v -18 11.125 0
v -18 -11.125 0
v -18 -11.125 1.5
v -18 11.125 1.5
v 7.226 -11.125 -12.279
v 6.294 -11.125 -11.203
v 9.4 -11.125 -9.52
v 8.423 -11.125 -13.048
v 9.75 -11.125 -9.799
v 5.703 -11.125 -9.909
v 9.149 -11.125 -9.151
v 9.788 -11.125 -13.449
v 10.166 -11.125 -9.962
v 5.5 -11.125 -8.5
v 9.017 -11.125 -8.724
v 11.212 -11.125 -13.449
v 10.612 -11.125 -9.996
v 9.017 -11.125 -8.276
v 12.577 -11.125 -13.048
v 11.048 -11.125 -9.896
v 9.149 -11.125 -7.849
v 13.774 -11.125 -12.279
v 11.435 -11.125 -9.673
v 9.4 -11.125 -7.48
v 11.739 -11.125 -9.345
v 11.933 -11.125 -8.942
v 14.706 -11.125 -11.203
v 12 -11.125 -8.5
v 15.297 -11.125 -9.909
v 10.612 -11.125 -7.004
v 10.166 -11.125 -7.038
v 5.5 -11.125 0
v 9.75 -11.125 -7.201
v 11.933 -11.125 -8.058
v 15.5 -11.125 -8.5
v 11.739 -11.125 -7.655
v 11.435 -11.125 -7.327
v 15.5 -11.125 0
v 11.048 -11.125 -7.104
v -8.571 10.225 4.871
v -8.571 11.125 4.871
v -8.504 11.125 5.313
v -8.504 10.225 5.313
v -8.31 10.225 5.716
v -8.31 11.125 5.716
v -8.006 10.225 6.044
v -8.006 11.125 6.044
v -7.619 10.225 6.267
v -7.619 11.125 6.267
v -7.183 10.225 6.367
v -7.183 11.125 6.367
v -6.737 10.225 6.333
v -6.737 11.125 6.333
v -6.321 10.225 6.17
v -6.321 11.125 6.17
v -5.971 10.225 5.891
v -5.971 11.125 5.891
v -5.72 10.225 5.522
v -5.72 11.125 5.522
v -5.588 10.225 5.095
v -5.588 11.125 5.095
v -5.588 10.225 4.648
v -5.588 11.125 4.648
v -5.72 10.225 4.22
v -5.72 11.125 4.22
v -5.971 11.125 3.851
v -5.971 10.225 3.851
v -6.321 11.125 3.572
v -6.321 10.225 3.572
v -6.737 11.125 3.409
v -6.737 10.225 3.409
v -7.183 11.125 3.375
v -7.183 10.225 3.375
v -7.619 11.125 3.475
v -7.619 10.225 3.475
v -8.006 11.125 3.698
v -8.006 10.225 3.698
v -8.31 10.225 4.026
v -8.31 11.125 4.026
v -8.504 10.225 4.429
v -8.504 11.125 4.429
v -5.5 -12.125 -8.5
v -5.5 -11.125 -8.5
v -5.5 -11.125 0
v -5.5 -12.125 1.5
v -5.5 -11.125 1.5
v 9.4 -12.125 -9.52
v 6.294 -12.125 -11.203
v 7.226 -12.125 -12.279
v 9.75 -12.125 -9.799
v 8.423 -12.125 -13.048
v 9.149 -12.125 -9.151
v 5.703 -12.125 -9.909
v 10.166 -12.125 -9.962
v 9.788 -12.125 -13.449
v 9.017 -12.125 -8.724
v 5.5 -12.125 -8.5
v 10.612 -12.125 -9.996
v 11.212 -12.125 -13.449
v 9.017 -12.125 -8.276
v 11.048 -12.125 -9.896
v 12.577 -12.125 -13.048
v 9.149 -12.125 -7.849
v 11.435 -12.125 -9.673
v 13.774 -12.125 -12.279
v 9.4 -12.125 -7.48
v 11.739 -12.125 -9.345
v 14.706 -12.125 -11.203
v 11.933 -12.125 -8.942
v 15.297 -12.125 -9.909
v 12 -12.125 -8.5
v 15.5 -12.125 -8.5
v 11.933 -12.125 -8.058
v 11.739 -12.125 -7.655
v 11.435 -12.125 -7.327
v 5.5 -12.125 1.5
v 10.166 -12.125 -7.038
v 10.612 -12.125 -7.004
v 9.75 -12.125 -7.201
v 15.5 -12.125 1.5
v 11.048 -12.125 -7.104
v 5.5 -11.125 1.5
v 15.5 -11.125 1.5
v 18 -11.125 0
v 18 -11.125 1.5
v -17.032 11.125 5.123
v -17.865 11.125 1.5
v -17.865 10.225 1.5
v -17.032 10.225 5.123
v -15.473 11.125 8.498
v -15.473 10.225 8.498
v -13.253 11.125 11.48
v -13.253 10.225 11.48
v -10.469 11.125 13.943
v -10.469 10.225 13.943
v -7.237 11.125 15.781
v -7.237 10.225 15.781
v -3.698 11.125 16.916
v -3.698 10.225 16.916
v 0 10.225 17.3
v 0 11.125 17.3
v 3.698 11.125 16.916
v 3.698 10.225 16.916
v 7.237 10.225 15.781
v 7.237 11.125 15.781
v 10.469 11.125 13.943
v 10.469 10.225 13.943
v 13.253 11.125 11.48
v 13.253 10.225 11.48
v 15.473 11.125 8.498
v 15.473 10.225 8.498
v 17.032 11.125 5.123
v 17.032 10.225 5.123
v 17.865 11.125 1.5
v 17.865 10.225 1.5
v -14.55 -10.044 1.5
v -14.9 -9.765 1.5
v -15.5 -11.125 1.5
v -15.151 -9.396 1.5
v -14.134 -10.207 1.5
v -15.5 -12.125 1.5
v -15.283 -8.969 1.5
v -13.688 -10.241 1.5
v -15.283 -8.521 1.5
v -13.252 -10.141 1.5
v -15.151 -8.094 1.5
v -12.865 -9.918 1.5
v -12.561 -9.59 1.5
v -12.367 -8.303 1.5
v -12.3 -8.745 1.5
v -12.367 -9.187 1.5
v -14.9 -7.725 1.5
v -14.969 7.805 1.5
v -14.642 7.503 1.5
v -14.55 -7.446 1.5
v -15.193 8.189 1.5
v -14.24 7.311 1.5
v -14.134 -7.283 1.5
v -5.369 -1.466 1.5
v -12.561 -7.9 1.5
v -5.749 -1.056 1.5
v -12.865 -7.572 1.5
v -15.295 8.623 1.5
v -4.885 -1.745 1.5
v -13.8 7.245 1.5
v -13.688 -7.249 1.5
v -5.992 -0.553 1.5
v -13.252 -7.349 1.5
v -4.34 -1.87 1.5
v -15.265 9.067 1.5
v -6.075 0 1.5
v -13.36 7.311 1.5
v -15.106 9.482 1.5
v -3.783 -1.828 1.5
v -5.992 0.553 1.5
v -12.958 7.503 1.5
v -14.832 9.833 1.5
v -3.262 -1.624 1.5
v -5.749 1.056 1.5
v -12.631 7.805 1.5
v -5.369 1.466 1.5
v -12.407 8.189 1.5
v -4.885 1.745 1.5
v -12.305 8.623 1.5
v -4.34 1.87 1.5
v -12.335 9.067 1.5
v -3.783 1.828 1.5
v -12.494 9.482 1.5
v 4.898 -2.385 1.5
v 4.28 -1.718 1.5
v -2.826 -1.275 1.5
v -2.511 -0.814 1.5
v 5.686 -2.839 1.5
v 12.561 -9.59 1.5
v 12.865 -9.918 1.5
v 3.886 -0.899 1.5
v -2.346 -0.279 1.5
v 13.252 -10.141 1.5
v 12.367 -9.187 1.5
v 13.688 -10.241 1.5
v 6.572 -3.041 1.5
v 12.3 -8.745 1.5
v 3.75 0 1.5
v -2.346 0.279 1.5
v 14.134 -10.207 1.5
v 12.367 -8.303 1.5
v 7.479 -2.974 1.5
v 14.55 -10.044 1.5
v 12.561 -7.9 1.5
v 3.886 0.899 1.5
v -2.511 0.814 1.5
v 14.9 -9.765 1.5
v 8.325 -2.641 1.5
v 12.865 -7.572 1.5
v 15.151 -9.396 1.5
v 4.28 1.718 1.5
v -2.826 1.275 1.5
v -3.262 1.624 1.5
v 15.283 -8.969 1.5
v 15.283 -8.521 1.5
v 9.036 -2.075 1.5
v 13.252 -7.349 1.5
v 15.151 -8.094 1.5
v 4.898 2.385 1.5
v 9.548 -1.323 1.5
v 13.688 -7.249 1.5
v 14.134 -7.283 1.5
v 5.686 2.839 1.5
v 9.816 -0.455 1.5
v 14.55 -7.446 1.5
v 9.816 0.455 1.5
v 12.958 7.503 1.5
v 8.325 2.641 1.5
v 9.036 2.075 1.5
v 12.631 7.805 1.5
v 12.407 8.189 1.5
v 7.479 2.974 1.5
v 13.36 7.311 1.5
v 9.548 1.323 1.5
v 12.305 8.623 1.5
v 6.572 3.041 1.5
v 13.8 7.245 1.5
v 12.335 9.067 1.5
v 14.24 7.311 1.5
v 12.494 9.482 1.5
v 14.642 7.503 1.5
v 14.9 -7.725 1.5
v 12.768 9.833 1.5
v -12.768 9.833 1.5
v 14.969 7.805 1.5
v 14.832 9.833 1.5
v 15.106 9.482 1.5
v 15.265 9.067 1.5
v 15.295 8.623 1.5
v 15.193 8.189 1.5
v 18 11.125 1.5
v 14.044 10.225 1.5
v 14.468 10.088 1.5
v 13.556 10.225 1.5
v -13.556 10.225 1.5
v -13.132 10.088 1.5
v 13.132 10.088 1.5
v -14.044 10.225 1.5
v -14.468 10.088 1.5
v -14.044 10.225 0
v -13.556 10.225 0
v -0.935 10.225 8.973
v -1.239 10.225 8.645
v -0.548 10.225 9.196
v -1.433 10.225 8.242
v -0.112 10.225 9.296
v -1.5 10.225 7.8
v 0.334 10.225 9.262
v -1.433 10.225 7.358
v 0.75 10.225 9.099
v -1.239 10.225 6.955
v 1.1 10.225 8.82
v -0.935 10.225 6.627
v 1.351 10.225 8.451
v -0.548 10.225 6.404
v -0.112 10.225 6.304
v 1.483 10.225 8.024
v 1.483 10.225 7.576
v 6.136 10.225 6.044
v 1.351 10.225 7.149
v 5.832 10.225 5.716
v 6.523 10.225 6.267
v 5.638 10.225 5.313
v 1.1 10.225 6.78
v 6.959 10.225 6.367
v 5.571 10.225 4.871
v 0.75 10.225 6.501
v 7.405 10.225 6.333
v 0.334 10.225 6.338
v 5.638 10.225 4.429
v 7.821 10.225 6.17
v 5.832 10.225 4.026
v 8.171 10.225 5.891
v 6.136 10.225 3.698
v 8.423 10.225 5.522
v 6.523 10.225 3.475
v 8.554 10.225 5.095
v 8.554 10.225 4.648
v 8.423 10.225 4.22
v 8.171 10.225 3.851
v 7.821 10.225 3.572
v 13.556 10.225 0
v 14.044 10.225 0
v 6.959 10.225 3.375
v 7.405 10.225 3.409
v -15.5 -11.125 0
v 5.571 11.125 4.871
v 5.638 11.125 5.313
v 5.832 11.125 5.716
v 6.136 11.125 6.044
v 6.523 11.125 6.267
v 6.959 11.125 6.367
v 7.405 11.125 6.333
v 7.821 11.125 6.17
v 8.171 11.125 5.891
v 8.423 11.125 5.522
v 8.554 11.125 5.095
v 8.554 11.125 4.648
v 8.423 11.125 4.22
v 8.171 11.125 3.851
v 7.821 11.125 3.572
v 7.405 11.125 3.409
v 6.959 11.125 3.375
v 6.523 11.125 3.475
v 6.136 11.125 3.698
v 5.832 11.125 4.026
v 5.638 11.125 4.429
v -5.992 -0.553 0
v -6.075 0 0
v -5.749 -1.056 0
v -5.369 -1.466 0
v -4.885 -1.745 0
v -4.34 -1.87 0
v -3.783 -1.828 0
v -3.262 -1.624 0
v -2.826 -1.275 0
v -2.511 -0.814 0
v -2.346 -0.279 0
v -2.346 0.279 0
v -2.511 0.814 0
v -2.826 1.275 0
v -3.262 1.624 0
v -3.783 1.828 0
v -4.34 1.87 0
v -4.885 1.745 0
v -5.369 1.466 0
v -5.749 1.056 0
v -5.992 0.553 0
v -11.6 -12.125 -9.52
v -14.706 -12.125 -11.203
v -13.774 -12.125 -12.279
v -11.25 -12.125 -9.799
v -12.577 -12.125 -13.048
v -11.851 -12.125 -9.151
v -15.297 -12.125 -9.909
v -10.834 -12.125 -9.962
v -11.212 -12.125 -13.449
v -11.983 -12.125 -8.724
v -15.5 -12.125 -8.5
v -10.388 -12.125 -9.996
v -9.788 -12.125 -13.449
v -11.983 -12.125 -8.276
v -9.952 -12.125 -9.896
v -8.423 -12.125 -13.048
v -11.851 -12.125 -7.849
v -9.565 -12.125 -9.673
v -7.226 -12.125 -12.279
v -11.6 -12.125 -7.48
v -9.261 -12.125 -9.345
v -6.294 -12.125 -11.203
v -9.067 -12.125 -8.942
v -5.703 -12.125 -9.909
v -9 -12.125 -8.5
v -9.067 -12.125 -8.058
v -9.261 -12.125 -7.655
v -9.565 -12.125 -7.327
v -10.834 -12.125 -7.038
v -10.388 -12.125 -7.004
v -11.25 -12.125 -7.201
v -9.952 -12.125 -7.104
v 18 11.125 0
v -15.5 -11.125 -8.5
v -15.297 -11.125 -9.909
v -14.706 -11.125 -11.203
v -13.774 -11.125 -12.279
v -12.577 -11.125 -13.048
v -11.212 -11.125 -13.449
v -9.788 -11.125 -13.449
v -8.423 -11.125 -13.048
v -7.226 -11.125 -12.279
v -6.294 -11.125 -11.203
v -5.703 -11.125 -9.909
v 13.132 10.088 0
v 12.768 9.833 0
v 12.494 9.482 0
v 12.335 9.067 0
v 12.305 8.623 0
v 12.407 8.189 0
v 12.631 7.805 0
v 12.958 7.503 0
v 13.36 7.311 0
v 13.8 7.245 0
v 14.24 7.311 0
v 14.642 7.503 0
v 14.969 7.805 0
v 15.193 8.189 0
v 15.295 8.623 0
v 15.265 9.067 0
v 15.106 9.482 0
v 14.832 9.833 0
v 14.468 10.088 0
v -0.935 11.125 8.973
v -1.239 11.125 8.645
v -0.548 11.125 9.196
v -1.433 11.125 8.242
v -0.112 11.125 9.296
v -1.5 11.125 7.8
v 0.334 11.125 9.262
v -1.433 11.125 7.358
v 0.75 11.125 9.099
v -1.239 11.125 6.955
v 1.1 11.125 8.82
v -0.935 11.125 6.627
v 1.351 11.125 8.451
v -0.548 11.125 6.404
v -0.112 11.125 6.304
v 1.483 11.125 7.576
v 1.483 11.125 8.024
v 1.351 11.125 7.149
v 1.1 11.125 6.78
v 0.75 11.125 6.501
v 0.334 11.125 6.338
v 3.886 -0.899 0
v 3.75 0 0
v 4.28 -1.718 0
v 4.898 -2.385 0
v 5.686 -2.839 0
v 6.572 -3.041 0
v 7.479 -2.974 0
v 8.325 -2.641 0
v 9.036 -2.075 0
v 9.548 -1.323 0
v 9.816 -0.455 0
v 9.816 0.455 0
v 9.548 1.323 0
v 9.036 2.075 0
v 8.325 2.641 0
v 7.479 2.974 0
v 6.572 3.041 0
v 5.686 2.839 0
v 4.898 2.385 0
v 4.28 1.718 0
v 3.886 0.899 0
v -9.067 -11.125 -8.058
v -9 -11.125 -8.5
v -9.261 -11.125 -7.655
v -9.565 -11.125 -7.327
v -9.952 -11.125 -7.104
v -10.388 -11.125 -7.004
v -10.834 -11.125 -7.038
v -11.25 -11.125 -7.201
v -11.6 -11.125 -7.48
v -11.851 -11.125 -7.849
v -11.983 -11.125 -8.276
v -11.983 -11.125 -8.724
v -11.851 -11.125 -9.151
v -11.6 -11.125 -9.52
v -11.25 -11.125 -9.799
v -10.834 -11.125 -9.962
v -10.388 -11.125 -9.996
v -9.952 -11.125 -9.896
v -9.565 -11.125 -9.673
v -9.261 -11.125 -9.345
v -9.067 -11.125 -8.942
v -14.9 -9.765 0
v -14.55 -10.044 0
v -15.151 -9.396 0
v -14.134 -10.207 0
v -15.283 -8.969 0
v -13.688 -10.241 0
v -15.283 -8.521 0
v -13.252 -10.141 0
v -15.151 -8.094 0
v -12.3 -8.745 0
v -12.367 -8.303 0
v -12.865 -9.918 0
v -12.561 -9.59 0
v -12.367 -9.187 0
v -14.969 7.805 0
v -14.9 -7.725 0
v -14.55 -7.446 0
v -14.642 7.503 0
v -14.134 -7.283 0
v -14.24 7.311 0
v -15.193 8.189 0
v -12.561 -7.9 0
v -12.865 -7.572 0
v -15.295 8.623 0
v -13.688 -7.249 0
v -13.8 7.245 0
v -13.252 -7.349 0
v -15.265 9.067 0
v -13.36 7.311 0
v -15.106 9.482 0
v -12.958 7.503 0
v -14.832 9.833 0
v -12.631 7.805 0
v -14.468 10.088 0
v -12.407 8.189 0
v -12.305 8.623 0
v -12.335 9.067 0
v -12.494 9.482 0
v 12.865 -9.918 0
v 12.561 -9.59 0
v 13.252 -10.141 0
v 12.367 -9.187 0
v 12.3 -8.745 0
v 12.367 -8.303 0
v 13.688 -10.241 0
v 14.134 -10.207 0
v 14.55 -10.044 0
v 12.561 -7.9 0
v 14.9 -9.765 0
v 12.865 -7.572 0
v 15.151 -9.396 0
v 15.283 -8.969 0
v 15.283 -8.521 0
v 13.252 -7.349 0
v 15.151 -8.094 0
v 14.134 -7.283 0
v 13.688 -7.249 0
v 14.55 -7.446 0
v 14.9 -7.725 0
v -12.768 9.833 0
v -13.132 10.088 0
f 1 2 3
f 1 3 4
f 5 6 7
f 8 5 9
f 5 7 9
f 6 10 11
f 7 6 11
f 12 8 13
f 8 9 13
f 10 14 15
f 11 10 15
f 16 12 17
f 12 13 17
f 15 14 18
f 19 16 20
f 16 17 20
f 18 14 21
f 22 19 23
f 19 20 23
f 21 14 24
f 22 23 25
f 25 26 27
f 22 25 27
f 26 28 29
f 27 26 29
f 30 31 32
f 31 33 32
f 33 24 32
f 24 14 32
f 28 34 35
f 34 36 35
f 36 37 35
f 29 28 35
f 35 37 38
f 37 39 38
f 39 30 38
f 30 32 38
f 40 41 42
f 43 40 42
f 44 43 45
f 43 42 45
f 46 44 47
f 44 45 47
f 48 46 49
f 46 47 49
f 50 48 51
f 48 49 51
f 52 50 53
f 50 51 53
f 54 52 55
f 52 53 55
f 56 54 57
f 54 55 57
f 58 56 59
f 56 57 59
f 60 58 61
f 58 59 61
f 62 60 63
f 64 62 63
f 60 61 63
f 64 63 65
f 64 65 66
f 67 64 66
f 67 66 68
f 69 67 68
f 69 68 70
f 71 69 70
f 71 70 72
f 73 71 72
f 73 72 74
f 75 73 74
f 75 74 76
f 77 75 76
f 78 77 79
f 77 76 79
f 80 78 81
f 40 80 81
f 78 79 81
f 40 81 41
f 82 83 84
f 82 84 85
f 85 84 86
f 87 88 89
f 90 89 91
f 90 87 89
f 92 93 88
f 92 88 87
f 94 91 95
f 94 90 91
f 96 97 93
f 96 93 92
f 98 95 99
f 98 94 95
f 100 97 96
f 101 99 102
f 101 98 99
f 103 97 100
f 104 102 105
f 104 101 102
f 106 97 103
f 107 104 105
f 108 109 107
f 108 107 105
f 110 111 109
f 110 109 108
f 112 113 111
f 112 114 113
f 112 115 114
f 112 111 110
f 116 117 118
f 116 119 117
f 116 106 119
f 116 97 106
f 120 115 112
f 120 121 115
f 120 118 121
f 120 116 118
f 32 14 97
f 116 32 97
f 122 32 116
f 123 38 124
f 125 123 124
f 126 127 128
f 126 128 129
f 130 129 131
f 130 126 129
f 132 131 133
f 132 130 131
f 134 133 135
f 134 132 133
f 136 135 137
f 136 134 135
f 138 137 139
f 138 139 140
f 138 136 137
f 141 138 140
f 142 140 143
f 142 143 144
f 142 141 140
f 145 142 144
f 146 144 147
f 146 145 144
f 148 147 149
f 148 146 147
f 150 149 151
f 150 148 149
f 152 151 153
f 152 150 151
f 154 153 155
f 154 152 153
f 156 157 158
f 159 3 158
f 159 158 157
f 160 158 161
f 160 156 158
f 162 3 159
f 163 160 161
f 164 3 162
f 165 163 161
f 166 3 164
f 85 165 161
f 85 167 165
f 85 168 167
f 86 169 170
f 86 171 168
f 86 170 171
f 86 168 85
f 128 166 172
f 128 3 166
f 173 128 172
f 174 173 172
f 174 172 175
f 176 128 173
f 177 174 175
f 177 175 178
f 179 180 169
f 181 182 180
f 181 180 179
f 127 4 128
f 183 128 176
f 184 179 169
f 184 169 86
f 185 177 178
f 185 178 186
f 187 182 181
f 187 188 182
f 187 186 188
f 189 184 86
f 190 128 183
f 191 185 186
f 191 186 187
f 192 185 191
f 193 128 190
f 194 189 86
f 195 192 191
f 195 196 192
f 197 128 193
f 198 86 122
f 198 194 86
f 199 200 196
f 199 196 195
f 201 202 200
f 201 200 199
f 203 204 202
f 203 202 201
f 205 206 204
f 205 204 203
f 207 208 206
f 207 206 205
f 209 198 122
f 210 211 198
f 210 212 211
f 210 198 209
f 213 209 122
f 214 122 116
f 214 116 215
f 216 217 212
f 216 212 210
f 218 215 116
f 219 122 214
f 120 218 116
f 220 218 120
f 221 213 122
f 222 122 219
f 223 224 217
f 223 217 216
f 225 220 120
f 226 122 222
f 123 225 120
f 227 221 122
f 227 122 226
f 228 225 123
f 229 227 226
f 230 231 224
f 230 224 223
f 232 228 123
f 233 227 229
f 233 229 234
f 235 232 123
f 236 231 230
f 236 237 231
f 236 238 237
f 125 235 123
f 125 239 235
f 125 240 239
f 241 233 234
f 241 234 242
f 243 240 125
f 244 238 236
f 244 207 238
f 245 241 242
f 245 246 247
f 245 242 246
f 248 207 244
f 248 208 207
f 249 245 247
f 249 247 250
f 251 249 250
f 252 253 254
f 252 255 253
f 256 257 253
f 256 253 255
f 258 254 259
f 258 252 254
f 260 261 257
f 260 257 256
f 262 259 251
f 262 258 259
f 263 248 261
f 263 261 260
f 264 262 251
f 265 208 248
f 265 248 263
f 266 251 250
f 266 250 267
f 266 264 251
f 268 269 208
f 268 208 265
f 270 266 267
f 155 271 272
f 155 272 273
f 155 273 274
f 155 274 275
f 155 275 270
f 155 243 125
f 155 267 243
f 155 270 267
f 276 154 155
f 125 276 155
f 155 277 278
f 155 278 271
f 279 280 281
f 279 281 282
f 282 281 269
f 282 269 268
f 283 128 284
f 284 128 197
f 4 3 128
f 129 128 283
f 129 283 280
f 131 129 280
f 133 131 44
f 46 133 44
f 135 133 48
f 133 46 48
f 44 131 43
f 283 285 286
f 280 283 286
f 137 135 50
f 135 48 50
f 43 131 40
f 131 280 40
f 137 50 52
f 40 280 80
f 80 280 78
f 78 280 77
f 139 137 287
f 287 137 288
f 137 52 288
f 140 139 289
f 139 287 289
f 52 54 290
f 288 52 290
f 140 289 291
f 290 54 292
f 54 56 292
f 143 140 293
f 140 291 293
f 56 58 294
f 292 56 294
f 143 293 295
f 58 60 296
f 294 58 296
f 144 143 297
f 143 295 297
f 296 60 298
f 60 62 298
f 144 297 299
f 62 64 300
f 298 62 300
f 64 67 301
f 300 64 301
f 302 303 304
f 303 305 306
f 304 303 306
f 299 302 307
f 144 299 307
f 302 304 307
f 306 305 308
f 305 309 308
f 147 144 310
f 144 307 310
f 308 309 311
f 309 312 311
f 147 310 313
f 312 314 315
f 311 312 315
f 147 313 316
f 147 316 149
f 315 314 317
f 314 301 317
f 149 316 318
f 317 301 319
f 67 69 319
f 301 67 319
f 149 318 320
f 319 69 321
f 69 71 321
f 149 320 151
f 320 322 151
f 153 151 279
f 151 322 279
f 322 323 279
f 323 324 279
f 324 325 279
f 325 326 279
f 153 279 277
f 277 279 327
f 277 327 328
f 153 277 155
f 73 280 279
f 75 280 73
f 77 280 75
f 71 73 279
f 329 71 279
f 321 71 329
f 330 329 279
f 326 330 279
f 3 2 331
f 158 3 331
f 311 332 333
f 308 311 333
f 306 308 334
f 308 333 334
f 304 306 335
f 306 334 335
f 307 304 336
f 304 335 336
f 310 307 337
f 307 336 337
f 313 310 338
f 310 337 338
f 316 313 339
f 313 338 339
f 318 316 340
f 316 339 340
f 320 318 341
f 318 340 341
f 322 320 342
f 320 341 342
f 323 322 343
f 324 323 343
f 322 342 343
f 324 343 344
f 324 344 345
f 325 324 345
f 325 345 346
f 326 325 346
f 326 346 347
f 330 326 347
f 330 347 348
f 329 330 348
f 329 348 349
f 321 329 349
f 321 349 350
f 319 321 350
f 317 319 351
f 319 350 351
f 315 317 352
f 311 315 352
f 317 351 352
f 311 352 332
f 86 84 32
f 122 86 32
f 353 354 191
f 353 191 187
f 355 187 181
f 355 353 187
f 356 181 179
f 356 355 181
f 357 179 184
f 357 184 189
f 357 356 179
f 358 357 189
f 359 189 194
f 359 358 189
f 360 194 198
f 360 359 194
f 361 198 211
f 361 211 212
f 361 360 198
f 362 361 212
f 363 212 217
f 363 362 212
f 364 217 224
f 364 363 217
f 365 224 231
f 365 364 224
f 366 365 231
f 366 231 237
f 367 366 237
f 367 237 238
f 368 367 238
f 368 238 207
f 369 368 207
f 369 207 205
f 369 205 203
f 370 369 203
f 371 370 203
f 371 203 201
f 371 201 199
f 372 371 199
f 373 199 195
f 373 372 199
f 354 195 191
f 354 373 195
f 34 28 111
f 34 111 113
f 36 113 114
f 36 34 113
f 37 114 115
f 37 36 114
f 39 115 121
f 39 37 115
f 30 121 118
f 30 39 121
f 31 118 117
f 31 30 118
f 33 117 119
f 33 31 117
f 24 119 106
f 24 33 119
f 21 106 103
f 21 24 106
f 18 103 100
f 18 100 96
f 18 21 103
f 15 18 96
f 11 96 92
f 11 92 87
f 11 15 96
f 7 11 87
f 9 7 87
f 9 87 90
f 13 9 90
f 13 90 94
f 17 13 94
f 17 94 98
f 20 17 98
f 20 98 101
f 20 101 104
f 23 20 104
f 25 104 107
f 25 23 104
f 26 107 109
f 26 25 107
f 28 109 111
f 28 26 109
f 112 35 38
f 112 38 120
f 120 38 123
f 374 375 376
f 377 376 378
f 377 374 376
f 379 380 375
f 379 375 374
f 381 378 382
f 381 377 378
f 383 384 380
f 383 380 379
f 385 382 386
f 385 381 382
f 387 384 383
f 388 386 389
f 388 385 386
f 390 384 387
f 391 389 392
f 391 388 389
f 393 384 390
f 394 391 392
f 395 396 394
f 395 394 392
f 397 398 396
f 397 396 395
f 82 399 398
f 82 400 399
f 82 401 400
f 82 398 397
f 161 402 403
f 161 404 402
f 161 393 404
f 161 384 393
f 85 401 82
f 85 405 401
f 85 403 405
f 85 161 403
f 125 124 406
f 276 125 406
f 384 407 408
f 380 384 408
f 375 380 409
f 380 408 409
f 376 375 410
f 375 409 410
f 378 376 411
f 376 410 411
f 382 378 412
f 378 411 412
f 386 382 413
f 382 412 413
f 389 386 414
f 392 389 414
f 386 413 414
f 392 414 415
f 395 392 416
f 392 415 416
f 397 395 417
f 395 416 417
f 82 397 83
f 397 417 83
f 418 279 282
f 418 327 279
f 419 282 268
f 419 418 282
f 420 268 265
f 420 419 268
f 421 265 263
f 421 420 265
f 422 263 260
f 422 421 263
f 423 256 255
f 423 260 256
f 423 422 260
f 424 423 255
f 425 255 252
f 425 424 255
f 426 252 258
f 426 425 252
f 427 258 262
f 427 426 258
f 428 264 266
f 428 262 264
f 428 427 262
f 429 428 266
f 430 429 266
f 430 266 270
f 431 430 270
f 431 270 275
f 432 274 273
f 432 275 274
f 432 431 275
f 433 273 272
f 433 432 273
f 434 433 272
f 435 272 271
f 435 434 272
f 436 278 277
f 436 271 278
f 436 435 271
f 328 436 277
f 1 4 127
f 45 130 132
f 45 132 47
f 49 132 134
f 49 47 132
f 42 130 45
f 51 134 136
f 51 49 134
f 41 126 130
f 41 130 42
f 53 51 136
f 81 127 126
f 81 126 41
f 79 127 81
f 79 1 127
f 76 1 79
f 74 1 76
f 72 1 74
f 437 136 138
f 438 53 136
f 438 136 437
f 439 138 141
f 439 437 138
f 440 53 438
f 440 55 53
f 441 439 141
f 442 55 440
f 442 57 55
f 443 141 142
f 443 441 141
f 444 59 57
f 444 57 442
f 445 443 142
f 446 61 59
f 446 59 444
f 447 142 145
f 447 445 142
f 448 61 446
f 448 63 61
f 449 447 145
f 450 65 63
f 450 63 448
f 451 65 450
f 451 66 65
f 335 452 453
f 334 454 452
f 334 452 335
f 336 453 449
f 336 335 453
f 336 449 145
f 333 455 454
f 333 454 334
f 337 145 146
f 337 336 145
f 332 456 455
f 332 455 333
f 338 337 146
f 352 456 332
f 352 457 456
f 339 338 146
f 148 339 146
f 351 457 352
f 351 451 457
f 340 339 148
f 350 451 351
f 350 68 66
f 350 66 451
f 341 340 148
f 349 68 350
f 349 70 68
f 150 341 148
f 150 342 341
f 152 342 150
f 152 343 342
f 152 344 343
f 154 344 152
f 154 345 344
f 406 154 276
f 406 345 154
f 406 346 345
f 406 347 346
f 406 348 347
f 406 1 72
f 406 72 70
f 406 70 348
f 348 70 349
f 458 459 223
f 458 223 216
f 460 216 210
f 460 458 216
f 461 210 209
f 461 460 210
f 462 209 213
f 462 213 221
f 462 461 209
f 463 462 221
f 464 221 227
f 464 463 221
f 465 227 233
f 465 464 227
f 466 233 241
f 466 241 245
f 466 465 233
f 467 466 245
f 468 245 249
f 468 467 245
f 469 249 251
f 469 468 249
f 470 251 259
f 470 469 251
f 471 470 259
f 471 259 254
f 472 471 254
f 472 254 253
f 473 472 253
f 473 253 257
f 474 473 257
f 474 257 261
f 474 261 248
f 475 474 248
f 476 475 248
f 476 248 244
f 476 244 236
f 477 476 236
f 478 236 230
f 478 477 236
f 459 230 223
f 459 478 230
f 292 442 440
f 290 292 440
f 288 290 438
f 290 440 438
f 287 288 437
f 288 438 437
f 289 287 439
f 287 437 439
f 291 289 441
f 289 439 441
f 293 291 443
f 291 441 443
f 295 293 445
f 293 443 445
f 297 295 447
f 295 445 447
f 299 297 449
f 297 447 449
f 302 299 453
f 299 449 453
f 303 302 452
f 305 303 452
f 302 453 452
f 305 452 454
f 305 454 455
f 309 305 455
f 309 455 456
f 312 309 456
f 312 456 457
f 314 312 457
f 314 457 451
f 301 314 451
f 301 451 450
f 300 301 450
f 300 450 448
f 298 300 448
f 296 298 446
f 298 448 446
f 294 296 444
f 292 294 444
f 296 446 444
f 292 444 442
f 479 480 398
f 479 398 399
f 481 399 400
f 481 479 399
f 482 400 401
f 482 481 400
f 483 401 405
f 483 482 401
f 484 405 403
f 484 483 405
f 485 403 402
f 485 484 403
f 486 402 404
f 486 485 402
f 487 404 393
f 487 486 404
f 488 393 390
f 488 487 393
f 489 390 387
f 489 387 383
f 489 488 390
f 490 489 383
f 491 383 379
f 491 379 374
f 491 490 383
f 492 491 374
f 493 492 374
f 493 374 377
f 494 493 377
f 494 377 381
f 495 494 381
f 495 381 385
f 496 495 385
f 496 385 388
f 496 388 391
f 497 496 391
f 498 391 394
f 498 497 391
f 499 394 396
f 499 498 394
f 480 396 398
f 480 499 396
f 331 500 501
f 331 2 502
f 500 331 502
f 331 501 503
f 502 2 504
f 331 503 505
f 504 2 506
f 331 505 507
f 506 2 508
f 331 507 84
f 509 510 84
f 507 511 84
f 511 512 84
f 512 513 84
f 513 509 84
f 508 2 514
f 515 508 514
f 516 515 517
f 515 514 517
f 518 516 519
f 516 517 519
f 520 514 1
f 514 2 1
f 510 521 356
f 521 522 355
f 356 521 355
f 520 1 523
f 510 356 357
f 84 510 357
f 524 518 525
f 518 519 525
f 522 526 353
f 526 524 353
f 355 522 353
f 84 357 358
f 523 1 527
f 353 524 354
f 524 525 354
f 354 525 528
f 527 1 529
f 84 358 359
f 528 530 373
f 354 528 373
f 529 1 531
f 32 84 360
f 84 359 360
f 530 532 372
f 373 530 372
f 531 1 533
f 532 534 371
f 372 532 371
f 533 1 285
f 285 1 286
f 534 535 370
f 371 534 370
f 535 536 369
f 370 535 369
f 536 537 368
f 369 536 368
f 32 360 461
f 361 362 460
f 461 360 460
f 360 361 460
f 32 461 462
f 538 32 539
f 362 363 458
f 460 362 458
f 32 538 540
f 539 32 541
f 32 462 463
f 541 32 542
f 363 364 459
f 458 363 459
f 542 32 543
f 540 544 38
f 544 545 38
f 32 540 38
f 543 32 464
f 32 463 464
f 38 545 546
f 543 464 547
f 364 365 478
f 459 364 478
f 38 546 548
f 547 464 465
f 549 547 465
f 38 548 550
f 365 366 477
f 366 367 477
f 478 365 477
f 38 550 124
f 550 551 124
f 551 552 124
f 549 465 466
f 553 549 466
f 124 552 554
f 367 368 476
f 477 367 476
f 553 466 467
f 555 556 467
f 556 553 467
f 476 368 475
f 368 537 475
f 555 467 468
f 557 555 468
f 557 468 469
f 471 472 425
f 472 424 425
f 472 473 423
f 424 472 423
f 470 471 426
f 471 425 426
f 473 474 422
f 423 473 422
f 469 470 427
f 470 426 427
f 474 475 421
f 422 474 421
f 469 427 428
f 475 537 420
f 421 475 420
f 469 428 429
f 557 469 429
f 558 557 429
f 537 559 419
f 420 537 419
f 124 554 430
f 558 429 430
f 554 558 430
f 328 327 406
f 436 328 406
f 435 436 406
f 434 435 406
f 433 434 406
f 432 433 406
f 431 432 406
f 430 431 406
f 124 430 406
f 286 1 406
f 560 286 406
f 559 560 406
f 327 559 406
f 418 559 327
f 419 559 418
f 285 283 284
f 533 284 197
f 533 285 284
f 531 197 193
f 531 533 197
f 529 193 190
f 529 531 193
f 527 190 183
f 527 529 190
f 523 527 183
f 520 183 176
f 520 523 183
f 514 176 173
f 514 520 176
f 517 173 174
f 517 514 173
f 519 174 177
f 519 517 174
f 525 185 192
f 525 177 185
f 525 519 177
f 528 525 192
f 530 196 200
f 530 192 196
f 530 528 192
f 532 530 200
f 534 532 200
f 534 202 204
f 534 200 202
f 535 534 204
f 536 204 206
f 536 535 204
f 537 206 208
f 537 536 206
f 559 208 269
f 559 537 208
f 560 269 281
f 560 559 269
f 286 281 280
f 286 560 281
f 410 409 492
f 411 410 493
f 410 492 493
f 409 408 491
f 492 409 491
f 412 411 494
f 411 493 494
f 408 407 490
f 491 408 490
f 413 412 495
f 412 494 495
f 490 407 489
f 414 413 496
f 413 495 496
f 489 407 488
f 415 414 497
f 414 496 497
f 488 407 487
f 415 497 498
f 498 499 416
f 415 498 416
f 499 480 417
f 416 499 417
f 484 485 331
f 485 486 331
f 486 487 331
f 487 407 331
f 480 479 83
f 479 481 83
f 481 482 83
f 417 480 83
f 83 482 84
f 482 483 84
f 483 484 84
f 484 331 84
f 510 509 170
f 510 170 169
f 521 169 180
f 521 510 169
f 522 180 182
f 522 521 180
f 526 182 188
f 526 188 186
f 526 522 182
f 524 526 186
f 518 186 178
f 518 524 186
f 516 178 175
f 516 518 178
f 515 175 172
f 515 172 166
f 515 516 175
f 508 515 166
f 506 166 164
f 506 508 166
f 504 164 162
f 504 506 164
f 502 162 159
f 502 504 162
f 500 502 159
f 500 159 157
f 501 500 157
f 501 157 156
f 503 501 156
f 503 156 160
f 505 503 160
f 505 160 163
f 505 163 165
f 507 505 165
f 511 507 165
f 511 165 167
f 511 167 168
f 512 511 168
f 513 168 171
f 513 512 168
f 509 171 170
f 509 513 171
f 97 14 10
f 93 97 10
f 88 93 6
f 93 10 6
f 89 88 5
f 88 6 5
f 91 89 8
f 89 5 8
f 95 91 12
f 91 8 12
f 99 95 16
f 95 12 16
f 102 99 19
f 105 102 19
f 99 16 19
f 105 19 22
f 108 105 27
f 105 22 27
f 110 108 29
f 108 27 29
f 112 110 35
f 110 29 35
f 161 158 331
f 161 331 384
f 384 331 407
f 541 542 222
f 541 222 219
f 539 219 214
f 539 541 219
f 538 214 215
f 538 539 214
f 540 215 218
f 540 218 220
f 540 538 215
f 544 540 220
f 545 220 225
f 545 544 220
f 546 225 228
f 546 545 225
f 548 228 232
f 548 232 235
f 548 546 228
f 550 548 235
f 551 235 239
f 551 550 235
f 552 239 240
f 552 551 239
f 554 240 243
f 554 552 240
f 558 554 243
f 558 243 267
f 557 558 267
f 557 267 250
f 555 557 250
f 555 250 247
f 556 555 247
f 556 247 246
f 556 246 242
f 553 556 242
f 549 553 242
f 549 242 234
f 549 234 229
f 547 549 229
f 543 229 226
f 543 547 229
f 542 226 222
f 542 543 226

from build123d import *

# Parameters (mm, degrees)
CROQUIS1_W              = 36
CROQUIS1_H              = 22.25
CROQUIS1_R              = 1.5
CROQUIS1_R_2            = 3.05
CROQUIS1_R_3            = 1.875
SALIENTE_EXTRUIR1_DEPTH = 1.5
CROQUIS2_R              = 1.5
CROQUIS2_W              = 10
CROQUIS2_H              = 1.5
SALIENTE_EXTRUIR2_DEPTH = 1
CROQUIS3_R              = 1.500000001
CROQUIS3_R_2            = 1.5
SALIENTE_EXTRUIR6_DEPTH = 0.9


with BuildPart() as part:
    # Croquis1 → Saliente-Extruir1 (new body)
    with BuildSketch(Plane.XY):
        Rectangle(CROQUIS1_W, CROQUIS1_H)
        with Locations((13.8, 8.745)):
            Circle(CROQUIS1_R, mode=Mode.SUBTRACT)
        with Locations(Location((13.8, -8.745, 0), (0, 0, 180))):
            Circle(CROQUIS1_R, mode=Mode.SUBTRACT)
        with Locations(Location((6.8, 0, 0), (0, 0, 180))):
            Circle(CROQUIS1_R_2, mode=Mode.SUBTRACT)
        with Locations((-13.8, -8.745)):
            Circle(CROQUIS1_R, mode=Mode.SUBTRACT)
        with Locations(Location((-13.8, 8.745, 0), (0, 0, 180))):
            Circle(CROQUIS1_R, mode=Mode.SUBTRACT)
        with Locations(Location((-4.2, 0, 0), (0, 0, 180))):
            Circle(CROQUIS1_R_3, mode=Mode.SUBTRACT)
    extrude(amount=SALIENTE_EXTRUIR1_DEPTH)

    # Croquis2 → Saliente-Extruir2 (add)
    # profile 1 of 4: a face of its own
    with BuildSketch(Plane.XZ.offset(11.125)):
        with BuildLine():
            Line((-5.5, -8.5), (-5.5, 0))
            Line((-5.5, 0), (-15.5, 0))
            Line((-15.5, 0), (-15.5, -8.5))
            ThreePointArc((-15.5, -8.5), (-10.5, -13.5), (-5.5, -8.5))
        make_face()
        with Locations((-10.5, -8.5)):
            Circle(CROQUIS2_R, mode=Mode.SUBTRACT)
    # profile 2 of 4: a face of its own
    with BuildSketch(Plane.XZ.offset(11.125)):
        with Locations((-10.5, 0.75)):
            Rectangle(CROQUIS2_W, CROQUIS2_H)
    # profile 3 of 4: a face of its own
    with BuildSketch(Plane.XZ.offset(11.125)):
        with BuildLine():
            Line((15.5, 0), (5.5, 0))
            Line((5.5, 0), (5.5, -8.5))
            ThreePointArc((5.5, -8.5), (10.5, -13.5), (15.5, -8.5))
            Line((15.5, -8.5), (15.5, 0))
        make_face()
        with Locations((10.5, -8.5)):
            Circle(CROQUIS2_R, mode=Mode.SUBTRACT)
    # profile 4 of 4: a face of its own
    with BuildSketch(Plane.XZ.offset(11.125)):
        with Locations((10.5, 0.75)):
            Rectangle(CROQUIS2_W, CROQUIS2_H)
    extrude(amount=SALIENTE_EXTRUIR2_DEPTH)

    # Croquis3 → Saliente-Extruir6 (add)
    # profile 1 of 2: a face of its own
    with BuildSketch(Plane(origin=(0, 11.125, 0), x_dir=(1, 0, 0), z_dir=(0, 1, 0))):
        with BuildLine():
            ThreePointArc((-17.865049678, -1.5), (0, -17.3), (17.865049678, -1.5))
            Line((17.865049678, -1.5), (-17.865049678, -1.5))
        make_face()
        with Locations(Location((-7.071067812, -4.871067812, 0), (0, 0, 180))):
            Circle(CROQUIS3_R, mode=Mode.SUBTRACT)
        with Locations(Location((0, -7.8, 0), (0, 0, 180))):
            Circle(CROQUIS3_R_2, mode=Mode.SUBTRACT)
        with Locations(Location((7.071067812, -4.871067812, 0), (0, 0, 180))):
            Circle(CROQUIS3_R_2, mode=Mode.SUBTRACT)
    # profile 2 of 2: a face of its own
    with BuildSketch(Plane(origin=(0, 11.125, 0), x_dir=(1, 0, 0), z_dir=(0, 1, 0))):
        with BuildLine():
            ThreePointArc((17.865049678, -1.5), (17.941399597, -0.751268579), (17.986383739, 0))
            Line((17.986383739, 0), (-17.986383739, 0))
            ThreePointArc((-17.986383739, 0), (-17.941399597, -0.751268579), (-17.865049678, -1.5))
            Line((-17.865049678, -1.5), (17.865049678, -1.5))
        make_face()
    extrude(amount=-SALIENTE_EXTRUIR6_DEPTH)


solid = part.part
